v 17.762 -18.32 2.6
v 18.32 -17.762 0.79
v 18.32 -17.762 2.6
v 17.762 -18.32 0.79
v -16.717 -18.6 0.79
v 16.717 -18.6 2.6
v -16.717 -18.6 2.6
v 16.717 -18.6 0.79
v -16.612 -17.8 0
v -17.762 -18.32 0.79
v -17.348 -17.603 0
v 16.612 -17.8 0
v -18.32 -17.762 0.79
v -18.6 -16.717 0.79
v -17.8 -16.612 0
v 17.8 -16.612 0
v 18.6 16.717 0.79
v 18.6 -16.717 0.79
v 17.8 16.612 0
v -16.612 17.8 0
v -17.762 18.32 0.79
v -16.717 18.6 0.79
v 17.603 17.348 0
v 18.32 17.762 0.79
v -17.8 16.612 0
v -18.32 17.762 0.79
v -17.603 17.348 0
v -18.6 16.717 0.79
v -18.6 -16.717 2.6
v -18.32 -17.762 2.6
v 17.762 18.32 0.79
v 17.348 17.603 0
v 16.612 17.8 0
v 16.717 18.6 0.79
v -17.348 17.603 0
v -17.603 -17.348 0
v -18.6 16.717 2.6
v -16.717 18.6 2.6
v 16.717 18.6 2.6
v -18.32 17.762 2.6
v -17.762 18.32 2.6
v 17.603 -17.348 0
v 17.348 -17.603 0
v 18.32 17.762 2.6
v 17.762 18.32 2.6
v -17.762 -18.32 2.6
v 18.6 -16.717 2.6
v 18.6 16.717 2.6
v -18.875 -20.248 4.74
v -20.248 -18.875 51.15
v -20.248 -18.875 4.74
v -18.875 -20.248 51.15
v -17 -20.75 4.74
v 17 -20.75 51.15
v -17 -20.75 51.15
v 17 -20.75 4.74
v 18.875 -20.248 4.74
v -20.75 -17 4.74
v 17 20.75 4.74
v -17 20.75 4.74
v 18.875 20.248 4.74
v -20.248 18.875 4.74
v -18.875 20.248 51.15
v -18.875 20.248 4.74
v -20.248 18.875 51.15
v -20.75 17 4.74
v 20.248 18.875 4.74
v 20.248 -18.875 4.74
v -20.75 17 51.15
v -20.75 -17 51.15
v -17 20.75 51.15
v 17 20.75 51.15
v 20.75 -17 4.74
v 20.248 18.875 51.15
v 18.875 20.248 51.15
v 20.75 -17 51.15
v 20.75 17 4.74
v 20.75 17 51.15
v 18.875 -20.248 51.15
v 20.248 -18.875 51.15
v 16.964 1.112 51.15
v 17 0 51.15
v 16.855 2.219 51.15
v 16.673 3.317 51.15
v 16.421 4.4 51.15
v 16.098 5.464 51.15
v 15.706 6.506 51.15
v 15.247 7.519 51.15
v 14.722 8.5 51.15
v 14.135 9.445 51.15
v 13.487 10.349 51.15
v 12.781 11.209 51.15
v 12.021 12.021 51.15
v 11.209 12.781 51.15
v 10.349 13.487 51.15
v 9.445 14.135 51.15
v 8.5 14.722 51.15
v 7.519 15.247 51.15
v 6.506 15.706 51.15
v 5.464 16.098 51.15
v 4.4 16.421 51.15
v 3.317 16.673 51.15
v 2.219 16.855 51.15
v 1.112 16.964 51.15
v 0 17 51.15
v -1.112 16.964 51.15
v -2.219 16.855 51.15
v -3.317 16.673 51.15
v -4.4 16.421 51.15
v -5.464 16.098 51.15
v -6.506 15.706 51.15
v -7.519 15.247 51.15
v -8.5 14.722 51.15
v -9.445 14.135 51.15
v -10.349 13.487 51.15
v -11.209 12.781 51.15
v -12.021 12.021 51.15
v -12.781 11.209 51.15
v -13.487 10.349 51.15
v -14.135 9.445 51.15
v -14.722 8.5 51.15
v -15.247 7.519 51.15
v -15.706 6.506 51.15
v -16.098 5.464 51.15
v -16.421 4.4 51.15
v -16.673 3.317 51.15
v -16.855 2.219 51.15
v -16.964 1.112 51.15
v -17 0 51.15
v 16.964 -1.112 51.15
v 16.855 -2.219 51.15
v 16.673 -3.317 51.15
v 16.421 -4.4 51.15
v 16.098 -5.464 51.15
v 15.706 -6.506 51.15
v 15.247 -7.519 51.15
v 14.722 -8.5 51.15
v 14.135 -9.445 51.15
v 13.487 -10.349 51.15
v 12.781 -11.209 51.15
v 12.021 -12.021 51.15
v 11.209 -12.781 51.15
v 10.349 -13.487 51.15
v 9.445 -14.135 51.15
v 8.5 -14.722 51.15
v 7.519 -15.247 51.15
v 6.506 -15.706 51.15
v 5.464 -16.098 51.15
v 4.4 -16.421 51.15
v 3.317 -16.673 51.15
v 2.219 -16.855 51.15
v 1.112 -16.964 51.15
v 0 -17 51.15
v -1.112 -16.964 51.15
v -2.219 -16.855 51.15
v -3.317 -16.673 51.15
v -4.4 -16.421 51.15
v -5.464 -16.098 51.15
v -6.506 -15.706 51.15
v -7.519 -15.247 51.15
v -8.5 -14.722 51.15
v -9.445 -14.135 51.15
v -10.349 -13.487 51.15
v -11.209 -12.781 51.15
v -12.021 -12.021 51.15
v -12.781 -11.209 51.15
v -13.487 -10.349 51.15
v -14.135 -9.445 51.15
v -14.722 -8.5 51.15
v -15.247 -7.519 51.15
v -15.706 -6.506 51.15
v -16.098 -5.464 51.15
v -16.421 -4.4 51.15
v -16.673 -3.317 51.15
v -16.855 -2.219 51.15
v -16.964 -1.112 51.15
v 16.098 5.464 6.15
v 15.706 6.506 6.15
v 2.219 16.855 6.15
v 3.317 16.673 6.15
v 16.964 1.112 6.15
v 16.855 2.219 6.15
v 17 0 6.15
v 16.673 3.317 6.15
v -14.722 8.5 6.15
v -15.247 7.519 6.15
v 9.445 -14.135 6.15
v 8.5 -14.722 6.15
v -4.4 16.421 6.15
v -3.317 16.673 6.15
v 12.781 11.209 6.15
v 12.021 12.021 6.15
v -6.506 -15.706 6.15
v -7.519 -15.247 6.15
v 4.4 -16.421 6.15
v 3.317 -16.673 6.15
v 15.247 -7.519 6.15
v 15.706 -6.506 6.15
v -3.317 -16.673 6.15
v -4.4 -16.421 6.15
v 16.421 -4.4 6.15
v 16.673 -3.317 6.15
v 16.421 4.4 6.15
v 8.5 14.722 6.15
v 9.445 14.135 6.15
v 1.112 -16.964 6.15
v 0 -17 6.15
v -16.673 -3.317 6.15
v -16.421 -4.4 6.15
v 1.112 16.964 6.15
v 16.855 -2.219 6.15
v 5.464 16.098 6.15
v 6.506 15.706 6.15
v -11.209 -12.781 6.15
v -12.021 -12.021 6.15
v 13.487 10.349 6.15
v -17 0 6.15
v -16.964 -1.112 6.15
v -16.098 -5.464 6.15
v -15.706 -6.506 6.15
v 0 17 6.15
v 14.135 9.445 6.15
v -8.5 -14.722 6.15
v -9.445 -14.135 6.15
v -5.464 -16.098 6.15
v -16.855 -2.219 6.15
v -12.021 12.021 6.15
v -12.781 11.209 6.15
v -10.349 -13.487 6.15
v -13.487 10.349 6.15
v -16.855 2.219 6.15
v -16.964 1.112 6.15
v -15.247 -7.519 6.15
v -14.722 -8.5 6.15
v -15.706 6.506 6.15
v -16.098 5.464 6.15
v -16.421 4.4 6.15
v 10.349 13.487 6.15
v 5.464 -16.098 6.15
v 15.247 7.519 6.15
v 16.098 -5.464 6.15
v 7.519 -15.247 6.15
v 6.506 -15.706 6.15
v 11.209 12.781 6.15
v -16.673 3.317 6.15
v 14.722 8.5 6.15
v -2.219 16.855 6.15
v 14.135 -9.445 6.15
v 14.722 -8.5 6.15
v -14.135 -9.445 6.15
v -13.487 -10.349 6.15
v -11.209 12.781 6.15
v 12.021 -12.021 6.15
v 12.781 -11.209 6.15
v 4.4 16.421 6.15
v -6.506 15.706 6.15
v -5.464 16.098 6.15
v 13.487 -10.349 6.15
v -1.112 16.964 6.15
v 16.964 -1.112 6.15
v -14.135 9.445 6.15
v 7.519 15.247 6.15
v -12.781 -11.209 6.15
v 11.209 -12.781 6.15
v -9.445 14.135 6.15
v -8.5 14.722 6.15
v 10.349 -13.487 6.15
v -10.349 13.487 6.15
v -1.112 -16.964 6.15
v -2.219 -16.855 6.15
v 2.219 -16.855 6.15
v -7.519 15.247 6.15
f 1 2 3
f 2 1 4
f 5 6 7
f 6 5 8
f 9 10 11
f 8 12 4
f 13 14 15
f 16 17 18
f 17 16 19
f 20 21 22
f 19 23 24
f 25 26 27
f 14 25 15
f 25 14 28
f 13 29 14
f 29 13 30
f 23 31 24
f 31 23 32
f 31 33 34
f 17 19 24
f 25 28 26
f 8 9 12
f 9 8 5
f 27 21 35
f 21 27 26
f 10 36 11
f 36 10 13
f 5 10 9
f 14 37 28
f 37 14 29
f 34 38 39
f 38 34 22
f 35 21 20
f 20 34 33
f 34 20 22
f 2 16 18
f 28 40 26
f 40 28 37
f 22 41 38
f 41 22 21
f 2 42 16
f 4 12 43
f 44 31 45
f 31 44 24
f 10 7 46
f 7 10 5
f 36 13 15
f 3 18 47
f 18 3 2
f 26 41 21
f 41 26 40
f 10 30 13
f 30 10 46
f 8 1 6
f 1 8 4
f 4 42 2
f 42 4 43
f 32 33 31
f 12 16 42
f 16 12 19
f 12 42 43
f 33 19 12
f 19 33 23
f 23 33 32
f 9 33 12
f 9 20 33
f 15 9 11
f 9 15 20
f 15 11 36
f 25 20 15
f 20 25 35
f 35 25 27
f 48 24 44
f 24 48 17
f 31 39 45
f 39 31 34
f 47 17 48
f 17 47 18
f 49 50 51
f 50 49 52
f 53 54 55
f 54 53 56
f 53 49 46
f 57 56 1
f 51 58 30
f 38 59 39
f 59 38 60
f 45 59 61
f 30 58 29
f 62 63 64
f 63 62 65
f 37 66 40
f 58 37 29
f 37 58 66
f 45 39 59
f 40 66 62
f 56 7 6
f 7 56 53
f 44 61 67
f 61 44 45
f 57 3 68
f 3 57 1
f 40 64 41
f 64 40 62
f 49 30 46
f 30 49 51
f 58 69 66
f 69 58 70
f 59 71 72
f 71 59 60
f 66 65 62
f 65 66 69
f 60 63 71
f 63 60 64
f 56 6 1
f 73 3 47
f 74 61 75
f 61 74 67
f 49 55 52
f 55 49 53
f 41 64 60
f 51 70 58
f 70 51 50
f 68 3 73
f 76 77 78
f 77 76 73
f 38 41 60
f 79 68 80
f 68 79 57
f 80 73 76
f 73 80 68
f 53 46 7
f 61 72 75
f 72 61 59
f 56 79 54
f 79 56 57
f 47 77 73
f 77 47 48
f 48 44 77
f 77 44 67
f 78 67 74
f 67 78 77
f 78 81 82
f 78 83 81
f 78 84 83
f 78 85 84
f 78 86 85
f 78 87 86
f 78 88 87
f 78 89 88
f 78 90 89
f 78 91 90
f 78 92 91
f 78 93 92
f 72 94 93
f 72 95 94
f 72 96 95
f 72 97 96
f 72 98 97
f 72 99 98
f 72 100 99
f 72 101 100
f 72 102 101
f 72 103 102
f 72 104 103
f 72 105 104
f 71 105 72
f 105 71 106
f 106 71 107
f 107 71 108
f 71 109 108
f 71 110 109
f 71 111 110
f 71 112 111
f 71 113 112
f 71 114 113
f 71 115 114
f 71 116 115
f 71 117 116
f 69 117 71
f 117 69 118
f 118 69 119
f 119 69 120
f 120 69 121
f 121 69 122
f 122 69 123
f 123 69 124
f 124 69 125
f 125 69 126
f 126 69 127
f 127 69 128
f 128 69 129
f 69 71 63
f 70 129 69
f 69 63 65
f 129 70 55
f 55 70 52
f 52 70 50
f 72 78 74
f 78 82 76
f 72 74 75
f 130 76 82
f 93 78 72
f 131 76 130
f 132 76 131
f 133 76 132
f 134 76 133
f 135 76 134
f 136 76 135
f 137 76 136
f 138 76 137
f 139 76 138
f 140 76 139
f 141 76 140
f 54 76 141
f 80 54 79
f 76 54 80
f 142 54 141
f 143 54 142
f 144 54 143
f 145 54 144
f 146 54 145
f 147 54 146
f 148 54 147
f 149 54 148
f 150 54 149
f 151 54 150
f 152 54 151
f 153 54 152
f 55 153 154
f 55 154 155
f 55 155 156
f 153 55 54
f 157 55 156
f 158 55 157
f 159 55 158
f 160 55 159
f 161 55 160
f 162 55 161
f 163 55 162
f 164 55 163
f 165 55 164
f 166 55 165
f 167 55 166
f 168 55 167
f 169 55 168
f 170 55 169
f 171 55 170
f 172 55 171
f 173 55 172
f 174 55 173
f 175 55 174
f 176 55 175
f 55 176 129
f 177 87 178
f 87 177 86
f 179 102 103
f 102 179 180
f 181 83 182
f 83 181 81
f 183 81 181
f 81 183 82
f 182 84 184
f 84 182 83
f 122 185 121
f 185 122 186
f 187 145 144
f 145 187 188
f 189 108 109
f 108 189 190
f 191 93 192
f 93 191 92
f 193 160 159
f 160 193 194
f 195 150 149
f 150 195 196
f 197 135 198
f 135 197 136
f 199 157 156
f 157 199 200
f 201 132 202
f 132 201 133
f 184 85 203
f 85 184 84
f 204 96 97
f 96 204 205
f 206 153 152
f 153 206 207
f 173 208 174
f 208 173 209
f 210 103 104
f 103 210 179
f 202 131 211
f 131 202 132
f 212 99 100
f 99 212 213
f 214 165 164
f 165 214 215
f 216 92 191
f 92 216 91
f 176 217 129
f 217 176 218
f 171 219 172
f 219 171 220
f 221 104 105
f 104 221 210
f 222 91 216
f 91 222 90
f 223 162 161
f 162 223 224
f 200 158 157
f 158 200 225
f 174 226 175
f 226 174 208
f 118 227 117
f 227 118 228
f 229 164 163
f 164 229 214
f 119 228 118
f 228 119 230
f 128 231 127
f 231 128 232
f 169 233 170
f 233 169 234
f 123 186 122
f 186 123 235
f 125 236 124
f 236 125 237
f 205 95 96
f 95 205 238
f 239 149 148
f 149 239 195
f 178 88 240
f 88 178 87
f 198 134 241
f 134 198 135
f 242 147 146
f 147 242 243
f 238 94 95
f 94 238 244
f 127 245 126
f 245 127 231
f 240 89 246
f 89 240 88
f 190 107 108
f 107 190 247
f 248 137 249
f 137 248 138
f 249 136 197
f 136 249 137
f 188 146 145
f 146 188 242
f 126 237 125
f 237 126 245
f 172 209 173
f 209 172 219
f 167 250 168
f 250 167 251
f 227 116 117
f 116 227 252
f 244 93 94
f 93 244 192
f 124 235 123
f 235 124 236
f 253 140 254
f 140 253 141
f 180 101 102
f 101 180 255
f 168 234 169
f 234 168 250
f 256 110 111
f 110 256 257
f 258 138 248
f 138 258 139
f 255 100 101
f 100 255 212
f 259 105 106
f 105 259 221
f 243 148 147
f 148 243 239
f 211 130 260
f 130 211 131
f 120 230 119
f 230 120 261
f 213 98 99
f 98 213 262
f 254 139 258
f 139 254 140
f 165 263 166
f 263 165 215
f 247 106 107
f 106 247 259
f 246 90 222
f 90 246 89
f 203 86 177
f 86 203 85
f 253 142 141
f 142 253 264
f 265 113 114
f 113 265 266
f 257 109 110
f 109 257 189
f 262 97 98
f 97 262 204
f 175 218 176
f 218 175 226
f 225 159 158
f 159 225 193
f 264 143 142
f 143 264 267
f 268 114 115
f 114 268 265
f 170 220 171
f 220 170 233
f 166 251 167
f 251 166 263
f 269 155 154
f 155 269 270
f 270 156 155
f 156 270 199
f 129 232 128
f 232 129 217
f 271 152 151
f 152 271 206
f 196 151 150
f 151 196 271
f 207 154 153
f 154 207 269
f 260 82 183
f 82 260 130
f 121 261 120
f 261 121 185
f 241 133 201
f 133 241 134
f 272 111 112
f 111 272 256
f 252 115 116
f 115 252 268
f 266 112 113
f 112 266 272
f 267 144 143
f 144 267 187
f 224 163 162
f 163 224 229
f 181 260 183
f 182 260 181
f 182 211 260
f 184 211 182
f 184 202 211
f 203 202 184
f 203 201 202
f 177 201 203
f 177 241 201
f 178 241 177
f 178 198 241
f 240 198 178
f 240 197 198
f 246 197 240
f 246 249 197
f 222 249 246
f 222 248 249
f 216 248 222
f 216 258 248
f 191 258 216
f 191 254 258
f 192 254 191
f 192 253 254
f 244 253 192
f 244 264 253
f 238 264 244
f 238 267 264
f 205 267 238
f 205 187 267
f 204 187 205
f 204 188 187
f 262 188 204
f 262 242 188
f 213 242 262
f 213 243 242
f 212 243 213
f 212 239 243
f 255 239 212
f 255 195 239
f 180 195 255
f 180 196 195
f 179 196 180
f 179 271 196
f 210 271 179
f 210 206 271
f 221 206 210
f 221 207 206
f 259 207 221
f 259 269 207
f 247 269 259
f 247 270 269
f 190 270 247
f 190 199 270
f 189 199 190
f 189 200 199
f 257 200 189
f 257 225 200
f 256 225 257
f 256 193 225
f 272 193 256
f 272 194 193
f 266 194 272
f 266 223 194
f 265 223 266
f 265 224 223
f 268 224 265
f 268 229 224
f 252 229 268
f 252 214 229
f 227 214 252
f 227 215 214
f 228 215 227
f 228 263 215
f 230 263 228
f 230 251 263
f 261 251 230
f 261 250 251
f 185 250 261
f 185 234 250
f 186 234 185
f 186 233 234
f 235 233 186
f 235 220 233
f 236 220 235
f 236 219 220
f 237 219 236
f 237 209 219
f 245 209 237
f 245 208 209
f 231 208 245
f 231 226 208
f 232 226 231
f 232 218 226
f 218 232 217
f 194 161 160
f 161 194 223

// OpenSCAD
// file: ../lib/syringe.scad
// SPDX-License-Identifier: MIT
// Copyright (c) 2026 Aaron Cupp
//
// syringe.scad — bore-grid racks: a Gridfinity block drilled with a 2D array of
// vertical holes. Syringes, barrel tips, rotary burrs — same form, different
// numbers.
//
// This is a layout helper over collar_cup_multi(), not new geometry. The bores
// are VERTICAL: no overhangs to print, densest packing, shortest block. Tilting
// them toward the user reads better and plucks easier, but costs all three —
// revisit only if upright proves annoying in practice.
//
// Bore depth is a CAPTURE depth, not the item's length. A 125 mm syringe in a
// 35 mm bore stands like a pen in a cup; the block doesn't grow to swallow it.
//
//   bore_grid(cols, rows, d, px, py)          — position list, for composing
//   syringe_rack(nx, ny, cols, rows, d, …)    — the finished rack
//
// Auto-pitch: with pitch = nx*GF/cols and the grid centred, the margin from the
// outermost bore's centre to the block edge is exactly pitch/2 — so a single
// condition, pitch >= bore + 2*min_wall, guards BOTH inter-bore webs and the
// outer wall. That's what the assert below checks. It is not decoration: a
// plausible-looking spec (10 mm syringes, 6 across a 2-unit block) leaves a
// 0.84 mm outer wall, which you would otherwise find out about on the printer.

include <vessel.scad>

SYR_CLR      = 1.0;   // bore = syringe_d + SYR_CLR (per diameter, not per side)
SYR_MIN_WALL = 1.2;   // minimum web between bores, and bore to outer face

// Bore centres for a cols × rows grid, centred on the origin.
function bore_grid(cols, rows, d, px, py) =
    [for (c = [0 : cols-1], r = [0 : rows-1])
        [(c - (cols-1)/2) * px, (r - (rows-1)/2) * py, d]];

// Rack of identical bores. pitch_x / pitch_y default to an even spread across
// the block footprint; pass them explicitly to pack tighter and leave a margin.
module syringe_rack(nx, ny, cols, rows, syringe_d, capture_h = 35,
                    floor = 1.4, clr = SYR_CLR, min_wall = SYR_MIN_WALL,
                    pitch_x = 0, pitch_y = 0) {
    px   = pitch_x > 0 ? pitch_x : nx * GF / cols;
    py   = pitch_y > 0 ? pitch_y : ny * GF / rows;
    bore = syringe_d + clr;

    assert(px >= bore + 2 * min_wall,
           "syringe_rack: too many columns — bores would merge or breach the outer wall");
    assert(py >= bore + 2 * min_wall,
           "syringe_rack: too many rows — bores would merge or breach the outer wall");

    collar_cup_multi(nx, ny, bore_grid(cols, rows, syringe_d, px, py),
                     capture_h, floor, clr);
}
// file: ../lib/vessel.scad
// SPDX-License-Identifier: MIT
// Copyright (c) 2026 Aaron Cupp
//
// vessel.scad — parametric collar cups for bottles, cans, and pen-form tools.
//
// A collar cup is a solid Gridfinity block with cylindrical bores sunk into it.
// It LOCATES a vessel; it does not clamp one. That distinction is the whole
// design: a collar that grips harder than the bin weighs comes out of the
// baseplate with the bottle when you grab it one-handed. Clearance, not
// interference — CLR is per-diameter, not per-side.
//
// Capture depth is roughly a third of the vessel's height. Enough to resist a
// knock (this bench sits under a 180 W fume-extractor intake), not so much that
// you're fishing the bottle out.
//
//   collar_cup(nx, ny, vessel_d, capture_h, …)   — one centred bore
//   collar_cup_multi(nx, ny, bores, capture_h, …) — bores = [[x, y, d], …]
//
// Cord slot: pen-form tools that stand in a cup are usually corded (the HARDELL
// rotary tool takes a barrel jack). Without a slot the lead drapes over the rim
// and levers the tool sideways. `cord_w > 0` cuts a channel from the bore out
// through the wall, open to the top.

include <gridfinity.scad>

CLR      = 1.0;   // bore = vessel_d + CLR. Loose on purpose — see above.
MIN_WALL = 1.2;   // minimum material between two bores, and bore to outer face

// ---- geometry guards ----
// Overlapping bores and bores that break out through the side wall both still
// render as perfectly watertight, 2-manifold meshes — CI cannot tell you the
// part is wrong, only that it is closed. These asserts encode the intent that
// the mesh check can't. Cheap, and they fire at render time rather than on the
// printer.
function _pair_gaps(bores, clr) = [
    for (i = [0 : len(bores)-1], j = [0 : len(bores)-1]) if (i < j)
        norm([bores[i][0]-bores[j][0], bores[i][1]-bores[j][1]])
        - (bores[i][2]+clr)/2 - (bores[j][2]+clr)/2
];
function _edge_gaps(bores, clr, W, D) = [
    for (b = bores) min(W/2 - abs(b[0]) - (b[2]+clr)/2,
                        D/2 - abs(b[1]) - (b[2]+clr)/2)
];

// Multi-bore block. Bores are [x, y, diameter] in mm, relative to the block centre.
module collar_cup_multi(nx, ny, bores, capture_h, floor = 1.4, clr = CLR,
                        cord_w = 0, cord_at = 0, min_wall = MIN_WALL) {
    h = BIN_BASE_H + floor + capture_h;
    e = 0.1;
    W = nx*GF - 0.5; D = ny*GF - 0.5;
    _pg = _pair_gaps(bores, clr);
    _eg = _edge_gaps(bores, clr, W, D);
    assert(len(_pg) == 0 || min(_pg) >= min_wall,
           "collar_cup: bores are too close — they would merge into one pocket");
    assert(min(_eg) >= min_wall,
           "collar_cup: a bore breaches the outer wall — block needs more units");
    difference() {
        bin_blank(nx, ny, h);
        for (b = bores)
            translate([b[0], b[1], BIN_BASE_H + floor])
                cylinder(d = b[2] + clr, h = capture_h + e, $fn = 96);
        // Cord channel: from the first bore outward through the +X wall, open to
        // the rim so the lead drops in from above rather than threading.
        if (cord_w > 0)
            translate([bores[0][0], bores[0][1] - cord_w/2, BIN_BASE_H + floor + cord_at])
                cube([nx*GF, cord_w, h]);
    }
}

// Single centred bore — the common case.
module collar_cup(nx, ny, vessel_d, capture_h, floor = 1.4, clr = CLR,
                  cord_w = 0, cord_at = 0, min_wall = MIN_WALL) {
    collar_cup_multi(nx, ny, [[0, 0, vessel_d]], capture_h, floor, clr,
                     cord_w, cord_at, min_wall);
}

// Evenly spaced row of same-depth bores along X — for a rank of aerosol cans.
// Returns geometry, not a list; pass the diameters and it lays them out on the
// block's centre line.
module collar_cup_row(nx, ny, diameters, capture_h, floor = 1.4, clr = CLR,
                      min_wall = MIN_WALL) {
    n = len(diameters);
    pitch = nx * GF / n;
    collar_cup_multi(nx, ny,
        [for (i = [0 : n-1]) [(i - (n-1)/2) * pitch, 0, diameters[i]]],
        capture_h, floor, clr, 0, 0, min_wall);
}
// file: rotary_station_common.scad
// rotary_station_common.scad — HARDELL mini rotary tool + its accessories.
//
// The tool stands VERTICAL in a 1×1 cup rather than lying in a 4×1 trough. A cup
// captures the bottom ~45 mm and lets the remaining ~86 mm stick up, the way a
// pen sits in a pen cup — 4× less bench for the same tool.
//
// NO CORD CHANNEL. The cup used to carry one; the user does not want it
// (2026-08-31). The 6 mm slot was inherited from the ENGRAVER's barrel jack back
// when the two tools were conflated, and had been flagged unverified for this
// tool since 2026-08-25. It is gone rather than widened.
// Store it COLLET-DOWN: a pointed burr at hand height on a bench you reach
// across is a snag you only notice once.

include <../lib/vessel.scad>
include <../lib/syringe.scad>

// ---- measured ----
//
// ✅ ATTRIBUTION RESOLVED 2026-08-25. The HARDELL measures **28 mm at the base,
// tapering to ≈30** at its widest. The 19.66 / 131.36 that sat here for months
// were never this tool — they belong to the small engraver, and moved to
// `../engraver-station/engraver_common.scad` along with the cup bored to them.
//
// That cup was watertight, manifold, and exactly the size it claimed to be. It
// simply would not have taken the tool named on it. Nothing in the toolchain
// can catch a right-shaped part cut for the wrong object.
//
// ⚠️ IT IS A TAPER, NOT A CYLINDER. Bore to the WIDEST section that enters —
// 30, not 28 — or the tool jams partway down.
BIT_SHANK   = 2.381;  // 3/32" collet — 0.09375 × 25.4. Nominal only; the bore
                      //   comes from the gauge, not from this. See BIT_BORE.
TOOL_D_BASE = 28.0;   // narrow end of the base
TOOL_D      = 30.0;   // widest section of the taper, measured 2026-08-25

// ---- the bore is stated, not derived ----
//
// TOOL_BORE IS THE FINISHED HOLE, the same way BIT_BORE is. It is NOT the tool's
// diameter and it does NOT get CLR added on top — bin_tool passes clr = 0.
//
// The old arrangement was the trap: collar_cup cuts `vessel_d + CLR`, so feeding
// it TOOL_D = 30 with the library's CLR = 1.0 produced a 31.0 bore while every
// comment in this file talked about 30. The printed cup was too tight in the
// hand and the number responsible was never written down anywhere.
//
// ⚠️ 34 IS STATED, NOT CALIPERED — "i think the bore should be about 34"
// (user, 2026-08-31). If the taper really does top out at ≈30, this leaves ~4 mm
// of slop and the tool leans ~5° in a 45 mm capture. That is a comfort call the
// user has made; the bin latches into the grid, so nothing tips either way.
TOOL_BORE   = 34.0;
TOOL_L      = undef;  // ❌ NOT MEASURED. Only ever fed TOOL_CAPTURE, and capture
                      //   is a comfort choice, not a fit constraint — the bin
                      //   latches into the grid so nothing tips. Not a blocker.

TOOL_CAPTURE = 45;   // [20:1:80] judgement, NOT derived — TOOL_L is unknown.
                     //   45 holds plenty and leaves the tool easy to pinch out.
                     //   Override with -D TOOL_CAPTURE= once you've held one.
// ⚠️ 0 ON PURPOSE — the user does not want a cord channel (2026-08-31). The 6 mm
// value here was the ENGRAVER's barrel-jack slot, inherited when the two tools
// were conflated and never verified against the HARDELL's lead.
CORD_W       = 0;

// ---- bit-hole clearance ----
// lib/vessel.scad's CLR = 1.0 mm is tuned for 50–80 mm vessels, where it's ~2%
// of the diameter. On a 2.381 mm shank the SAME 1.0 mm is 42% — the bits would
// rattle. Absolute clearance does not scale down; small bores need their own
// number.
//
// ✅ CALIBRATED 2026-08-25. `coupons/bit_fit_gauge.scad` was printed and the
// shanks go into the **2.7** hole; 2.6 does not take them. The HARDELL's bits
// and the small engraver's were confirmed the same size, so both tools share
// this bore — see `../engraver-station/engraver_common.scad`.
//
// BIT_BORE is the measurement and BIT_CLR is arithmetic, not the other way
// round. The gauge reads the FINISHED HOLE, which folds the shank diameter and
// this printer's hole shrinkage into one number — the only number a drilled
// block needs.
//
// The old BIT_CLR = 0.25 guess was TOO TIGHT: it cut 2.631, under the smallest
// hole that actually takes a shank. Every one of these holes would have needed
// reaming, which is precisely what the coupon exists to prevent.
//
// Re-run the coupon if the nozzle, filament or layer height changes.
BIT_BORE = 2.70;                    // gauge result — the finished hole
BIT_CLR  = BIT_BORE - BIT_SHANK;    // = 0.319


// An earlier edit to this file deleted BIT_SHANK by accident. `bin_tool` then
// rendered a perfectly valid STL from an undefined constant — OpenSCAD only
// WARNS — and it was the assert inside syringe_rack() that stopped the bit
// block. These asserts exist because a warning scrolls past and a broken part
// does not announce itself.
assert(is_num(BIT_SHANK) && BIT_SHANK > 0, "BIT_SHANK is undefined or non-positive.");
assert(is_num(BIT_BORE) && BIT_BORE > BIT_SHANK,
       "BIT_BORE must be a number larger than BIT_SHANK — it is the FINISHED hole.");
assert(is_num(TOOL_D) && TOOL_D >= TOOL_D_BASE,
       "TOOL_D must be a number, and the WIDEST section of the taper.");
assert(is_num(TOOL_BORE) && TOOL_BORE >= TOOL_D,
       "TOOL_BORE is the FINISHED hole and must be at least the tool's widest section.");
// ✅ COUNTED 2026-08-25: the HARDELL came with about **15 shank bits**, a stack
// of cut-off wheels and ~20 sanding disks.
//
// The old 14 × 5 = 70 was an upper bound taken from a 69-piece set on the
// assumption every piece was shank-mounted. It isn't, and the block was
// oversized by more than 4×. The wheels and disks are mandrel-mounted and want
// a pocket, not a bore — the largest cut-off wheel is 25 mm across.
//
// 5 × 3 = 15 on a 1×1 at an 8.4 × 14 pitch. The engraver's block took exactly
// this correction, 70 → 35, for exactly this reason.
BIT_COLS = 5; BIT_ROWS = 3;
BIT_CAPTURE = 18;   // bits are light; 18 mm keeps the block low under the hood
// main file
// bin_tool — 1×1 cup, the HARDELL standing vertical. No cord channel.
//
// THE BORE IS STATED, NOT DERIVED. TOOL_BORE is the FINISHED hole, so this
// passes clr = 0 — collar_cup would otherwise add the library's CLR = 1.0 on
// top. That is exactly what went wrong before: TOOL_D 30 + CLR 1.0 cut a 31.0
// bore while every comment claimed 30, and the printed cup was too tight.
//
// ⚠️ This REPLACES a cup bored to ⌀19.66 that carried this filename and this
// tool's name until 2026-08-25. That bore was the small engraver's — the file
// moved to `../engraver-station/bin_tool_engraver.scad` rather than being
// deleted, because the part was always correct, only mislabelled.
//
// CAPTURE IS A COMFORT CHOICE HERE, NOT A DERIVED NUMBER. The HARDELL's overall
// length has never been measured, and it does not need to be: the bin latches
// into the grid, so nothing tips, and with 1 mm of clearance in a 45 mm bore the
// tool leans about 1.3°. 45 holds plenty and leaves it easy to pinch out.
//
// PRINT: as emitted, feet down. No supports.
//
// SPDX-License-Identifier: CC-BY-NC-4.0
// Copyright (c) 2026 Aaron Cupp
include <rotary_station_common.scad>
use <../lib/vessel.scad>

assert(TOOL_BORE >= TOOL_D && TOOL_D >= TOOL_D_BASE,
       "bore must clear the taper's WIDEST section — one cut to the narrow end jams.");

collar_cup(1, 1, TOOL_BORE, TOOL_CAPTURE, clr = 0, cord_w = CORD_W);
